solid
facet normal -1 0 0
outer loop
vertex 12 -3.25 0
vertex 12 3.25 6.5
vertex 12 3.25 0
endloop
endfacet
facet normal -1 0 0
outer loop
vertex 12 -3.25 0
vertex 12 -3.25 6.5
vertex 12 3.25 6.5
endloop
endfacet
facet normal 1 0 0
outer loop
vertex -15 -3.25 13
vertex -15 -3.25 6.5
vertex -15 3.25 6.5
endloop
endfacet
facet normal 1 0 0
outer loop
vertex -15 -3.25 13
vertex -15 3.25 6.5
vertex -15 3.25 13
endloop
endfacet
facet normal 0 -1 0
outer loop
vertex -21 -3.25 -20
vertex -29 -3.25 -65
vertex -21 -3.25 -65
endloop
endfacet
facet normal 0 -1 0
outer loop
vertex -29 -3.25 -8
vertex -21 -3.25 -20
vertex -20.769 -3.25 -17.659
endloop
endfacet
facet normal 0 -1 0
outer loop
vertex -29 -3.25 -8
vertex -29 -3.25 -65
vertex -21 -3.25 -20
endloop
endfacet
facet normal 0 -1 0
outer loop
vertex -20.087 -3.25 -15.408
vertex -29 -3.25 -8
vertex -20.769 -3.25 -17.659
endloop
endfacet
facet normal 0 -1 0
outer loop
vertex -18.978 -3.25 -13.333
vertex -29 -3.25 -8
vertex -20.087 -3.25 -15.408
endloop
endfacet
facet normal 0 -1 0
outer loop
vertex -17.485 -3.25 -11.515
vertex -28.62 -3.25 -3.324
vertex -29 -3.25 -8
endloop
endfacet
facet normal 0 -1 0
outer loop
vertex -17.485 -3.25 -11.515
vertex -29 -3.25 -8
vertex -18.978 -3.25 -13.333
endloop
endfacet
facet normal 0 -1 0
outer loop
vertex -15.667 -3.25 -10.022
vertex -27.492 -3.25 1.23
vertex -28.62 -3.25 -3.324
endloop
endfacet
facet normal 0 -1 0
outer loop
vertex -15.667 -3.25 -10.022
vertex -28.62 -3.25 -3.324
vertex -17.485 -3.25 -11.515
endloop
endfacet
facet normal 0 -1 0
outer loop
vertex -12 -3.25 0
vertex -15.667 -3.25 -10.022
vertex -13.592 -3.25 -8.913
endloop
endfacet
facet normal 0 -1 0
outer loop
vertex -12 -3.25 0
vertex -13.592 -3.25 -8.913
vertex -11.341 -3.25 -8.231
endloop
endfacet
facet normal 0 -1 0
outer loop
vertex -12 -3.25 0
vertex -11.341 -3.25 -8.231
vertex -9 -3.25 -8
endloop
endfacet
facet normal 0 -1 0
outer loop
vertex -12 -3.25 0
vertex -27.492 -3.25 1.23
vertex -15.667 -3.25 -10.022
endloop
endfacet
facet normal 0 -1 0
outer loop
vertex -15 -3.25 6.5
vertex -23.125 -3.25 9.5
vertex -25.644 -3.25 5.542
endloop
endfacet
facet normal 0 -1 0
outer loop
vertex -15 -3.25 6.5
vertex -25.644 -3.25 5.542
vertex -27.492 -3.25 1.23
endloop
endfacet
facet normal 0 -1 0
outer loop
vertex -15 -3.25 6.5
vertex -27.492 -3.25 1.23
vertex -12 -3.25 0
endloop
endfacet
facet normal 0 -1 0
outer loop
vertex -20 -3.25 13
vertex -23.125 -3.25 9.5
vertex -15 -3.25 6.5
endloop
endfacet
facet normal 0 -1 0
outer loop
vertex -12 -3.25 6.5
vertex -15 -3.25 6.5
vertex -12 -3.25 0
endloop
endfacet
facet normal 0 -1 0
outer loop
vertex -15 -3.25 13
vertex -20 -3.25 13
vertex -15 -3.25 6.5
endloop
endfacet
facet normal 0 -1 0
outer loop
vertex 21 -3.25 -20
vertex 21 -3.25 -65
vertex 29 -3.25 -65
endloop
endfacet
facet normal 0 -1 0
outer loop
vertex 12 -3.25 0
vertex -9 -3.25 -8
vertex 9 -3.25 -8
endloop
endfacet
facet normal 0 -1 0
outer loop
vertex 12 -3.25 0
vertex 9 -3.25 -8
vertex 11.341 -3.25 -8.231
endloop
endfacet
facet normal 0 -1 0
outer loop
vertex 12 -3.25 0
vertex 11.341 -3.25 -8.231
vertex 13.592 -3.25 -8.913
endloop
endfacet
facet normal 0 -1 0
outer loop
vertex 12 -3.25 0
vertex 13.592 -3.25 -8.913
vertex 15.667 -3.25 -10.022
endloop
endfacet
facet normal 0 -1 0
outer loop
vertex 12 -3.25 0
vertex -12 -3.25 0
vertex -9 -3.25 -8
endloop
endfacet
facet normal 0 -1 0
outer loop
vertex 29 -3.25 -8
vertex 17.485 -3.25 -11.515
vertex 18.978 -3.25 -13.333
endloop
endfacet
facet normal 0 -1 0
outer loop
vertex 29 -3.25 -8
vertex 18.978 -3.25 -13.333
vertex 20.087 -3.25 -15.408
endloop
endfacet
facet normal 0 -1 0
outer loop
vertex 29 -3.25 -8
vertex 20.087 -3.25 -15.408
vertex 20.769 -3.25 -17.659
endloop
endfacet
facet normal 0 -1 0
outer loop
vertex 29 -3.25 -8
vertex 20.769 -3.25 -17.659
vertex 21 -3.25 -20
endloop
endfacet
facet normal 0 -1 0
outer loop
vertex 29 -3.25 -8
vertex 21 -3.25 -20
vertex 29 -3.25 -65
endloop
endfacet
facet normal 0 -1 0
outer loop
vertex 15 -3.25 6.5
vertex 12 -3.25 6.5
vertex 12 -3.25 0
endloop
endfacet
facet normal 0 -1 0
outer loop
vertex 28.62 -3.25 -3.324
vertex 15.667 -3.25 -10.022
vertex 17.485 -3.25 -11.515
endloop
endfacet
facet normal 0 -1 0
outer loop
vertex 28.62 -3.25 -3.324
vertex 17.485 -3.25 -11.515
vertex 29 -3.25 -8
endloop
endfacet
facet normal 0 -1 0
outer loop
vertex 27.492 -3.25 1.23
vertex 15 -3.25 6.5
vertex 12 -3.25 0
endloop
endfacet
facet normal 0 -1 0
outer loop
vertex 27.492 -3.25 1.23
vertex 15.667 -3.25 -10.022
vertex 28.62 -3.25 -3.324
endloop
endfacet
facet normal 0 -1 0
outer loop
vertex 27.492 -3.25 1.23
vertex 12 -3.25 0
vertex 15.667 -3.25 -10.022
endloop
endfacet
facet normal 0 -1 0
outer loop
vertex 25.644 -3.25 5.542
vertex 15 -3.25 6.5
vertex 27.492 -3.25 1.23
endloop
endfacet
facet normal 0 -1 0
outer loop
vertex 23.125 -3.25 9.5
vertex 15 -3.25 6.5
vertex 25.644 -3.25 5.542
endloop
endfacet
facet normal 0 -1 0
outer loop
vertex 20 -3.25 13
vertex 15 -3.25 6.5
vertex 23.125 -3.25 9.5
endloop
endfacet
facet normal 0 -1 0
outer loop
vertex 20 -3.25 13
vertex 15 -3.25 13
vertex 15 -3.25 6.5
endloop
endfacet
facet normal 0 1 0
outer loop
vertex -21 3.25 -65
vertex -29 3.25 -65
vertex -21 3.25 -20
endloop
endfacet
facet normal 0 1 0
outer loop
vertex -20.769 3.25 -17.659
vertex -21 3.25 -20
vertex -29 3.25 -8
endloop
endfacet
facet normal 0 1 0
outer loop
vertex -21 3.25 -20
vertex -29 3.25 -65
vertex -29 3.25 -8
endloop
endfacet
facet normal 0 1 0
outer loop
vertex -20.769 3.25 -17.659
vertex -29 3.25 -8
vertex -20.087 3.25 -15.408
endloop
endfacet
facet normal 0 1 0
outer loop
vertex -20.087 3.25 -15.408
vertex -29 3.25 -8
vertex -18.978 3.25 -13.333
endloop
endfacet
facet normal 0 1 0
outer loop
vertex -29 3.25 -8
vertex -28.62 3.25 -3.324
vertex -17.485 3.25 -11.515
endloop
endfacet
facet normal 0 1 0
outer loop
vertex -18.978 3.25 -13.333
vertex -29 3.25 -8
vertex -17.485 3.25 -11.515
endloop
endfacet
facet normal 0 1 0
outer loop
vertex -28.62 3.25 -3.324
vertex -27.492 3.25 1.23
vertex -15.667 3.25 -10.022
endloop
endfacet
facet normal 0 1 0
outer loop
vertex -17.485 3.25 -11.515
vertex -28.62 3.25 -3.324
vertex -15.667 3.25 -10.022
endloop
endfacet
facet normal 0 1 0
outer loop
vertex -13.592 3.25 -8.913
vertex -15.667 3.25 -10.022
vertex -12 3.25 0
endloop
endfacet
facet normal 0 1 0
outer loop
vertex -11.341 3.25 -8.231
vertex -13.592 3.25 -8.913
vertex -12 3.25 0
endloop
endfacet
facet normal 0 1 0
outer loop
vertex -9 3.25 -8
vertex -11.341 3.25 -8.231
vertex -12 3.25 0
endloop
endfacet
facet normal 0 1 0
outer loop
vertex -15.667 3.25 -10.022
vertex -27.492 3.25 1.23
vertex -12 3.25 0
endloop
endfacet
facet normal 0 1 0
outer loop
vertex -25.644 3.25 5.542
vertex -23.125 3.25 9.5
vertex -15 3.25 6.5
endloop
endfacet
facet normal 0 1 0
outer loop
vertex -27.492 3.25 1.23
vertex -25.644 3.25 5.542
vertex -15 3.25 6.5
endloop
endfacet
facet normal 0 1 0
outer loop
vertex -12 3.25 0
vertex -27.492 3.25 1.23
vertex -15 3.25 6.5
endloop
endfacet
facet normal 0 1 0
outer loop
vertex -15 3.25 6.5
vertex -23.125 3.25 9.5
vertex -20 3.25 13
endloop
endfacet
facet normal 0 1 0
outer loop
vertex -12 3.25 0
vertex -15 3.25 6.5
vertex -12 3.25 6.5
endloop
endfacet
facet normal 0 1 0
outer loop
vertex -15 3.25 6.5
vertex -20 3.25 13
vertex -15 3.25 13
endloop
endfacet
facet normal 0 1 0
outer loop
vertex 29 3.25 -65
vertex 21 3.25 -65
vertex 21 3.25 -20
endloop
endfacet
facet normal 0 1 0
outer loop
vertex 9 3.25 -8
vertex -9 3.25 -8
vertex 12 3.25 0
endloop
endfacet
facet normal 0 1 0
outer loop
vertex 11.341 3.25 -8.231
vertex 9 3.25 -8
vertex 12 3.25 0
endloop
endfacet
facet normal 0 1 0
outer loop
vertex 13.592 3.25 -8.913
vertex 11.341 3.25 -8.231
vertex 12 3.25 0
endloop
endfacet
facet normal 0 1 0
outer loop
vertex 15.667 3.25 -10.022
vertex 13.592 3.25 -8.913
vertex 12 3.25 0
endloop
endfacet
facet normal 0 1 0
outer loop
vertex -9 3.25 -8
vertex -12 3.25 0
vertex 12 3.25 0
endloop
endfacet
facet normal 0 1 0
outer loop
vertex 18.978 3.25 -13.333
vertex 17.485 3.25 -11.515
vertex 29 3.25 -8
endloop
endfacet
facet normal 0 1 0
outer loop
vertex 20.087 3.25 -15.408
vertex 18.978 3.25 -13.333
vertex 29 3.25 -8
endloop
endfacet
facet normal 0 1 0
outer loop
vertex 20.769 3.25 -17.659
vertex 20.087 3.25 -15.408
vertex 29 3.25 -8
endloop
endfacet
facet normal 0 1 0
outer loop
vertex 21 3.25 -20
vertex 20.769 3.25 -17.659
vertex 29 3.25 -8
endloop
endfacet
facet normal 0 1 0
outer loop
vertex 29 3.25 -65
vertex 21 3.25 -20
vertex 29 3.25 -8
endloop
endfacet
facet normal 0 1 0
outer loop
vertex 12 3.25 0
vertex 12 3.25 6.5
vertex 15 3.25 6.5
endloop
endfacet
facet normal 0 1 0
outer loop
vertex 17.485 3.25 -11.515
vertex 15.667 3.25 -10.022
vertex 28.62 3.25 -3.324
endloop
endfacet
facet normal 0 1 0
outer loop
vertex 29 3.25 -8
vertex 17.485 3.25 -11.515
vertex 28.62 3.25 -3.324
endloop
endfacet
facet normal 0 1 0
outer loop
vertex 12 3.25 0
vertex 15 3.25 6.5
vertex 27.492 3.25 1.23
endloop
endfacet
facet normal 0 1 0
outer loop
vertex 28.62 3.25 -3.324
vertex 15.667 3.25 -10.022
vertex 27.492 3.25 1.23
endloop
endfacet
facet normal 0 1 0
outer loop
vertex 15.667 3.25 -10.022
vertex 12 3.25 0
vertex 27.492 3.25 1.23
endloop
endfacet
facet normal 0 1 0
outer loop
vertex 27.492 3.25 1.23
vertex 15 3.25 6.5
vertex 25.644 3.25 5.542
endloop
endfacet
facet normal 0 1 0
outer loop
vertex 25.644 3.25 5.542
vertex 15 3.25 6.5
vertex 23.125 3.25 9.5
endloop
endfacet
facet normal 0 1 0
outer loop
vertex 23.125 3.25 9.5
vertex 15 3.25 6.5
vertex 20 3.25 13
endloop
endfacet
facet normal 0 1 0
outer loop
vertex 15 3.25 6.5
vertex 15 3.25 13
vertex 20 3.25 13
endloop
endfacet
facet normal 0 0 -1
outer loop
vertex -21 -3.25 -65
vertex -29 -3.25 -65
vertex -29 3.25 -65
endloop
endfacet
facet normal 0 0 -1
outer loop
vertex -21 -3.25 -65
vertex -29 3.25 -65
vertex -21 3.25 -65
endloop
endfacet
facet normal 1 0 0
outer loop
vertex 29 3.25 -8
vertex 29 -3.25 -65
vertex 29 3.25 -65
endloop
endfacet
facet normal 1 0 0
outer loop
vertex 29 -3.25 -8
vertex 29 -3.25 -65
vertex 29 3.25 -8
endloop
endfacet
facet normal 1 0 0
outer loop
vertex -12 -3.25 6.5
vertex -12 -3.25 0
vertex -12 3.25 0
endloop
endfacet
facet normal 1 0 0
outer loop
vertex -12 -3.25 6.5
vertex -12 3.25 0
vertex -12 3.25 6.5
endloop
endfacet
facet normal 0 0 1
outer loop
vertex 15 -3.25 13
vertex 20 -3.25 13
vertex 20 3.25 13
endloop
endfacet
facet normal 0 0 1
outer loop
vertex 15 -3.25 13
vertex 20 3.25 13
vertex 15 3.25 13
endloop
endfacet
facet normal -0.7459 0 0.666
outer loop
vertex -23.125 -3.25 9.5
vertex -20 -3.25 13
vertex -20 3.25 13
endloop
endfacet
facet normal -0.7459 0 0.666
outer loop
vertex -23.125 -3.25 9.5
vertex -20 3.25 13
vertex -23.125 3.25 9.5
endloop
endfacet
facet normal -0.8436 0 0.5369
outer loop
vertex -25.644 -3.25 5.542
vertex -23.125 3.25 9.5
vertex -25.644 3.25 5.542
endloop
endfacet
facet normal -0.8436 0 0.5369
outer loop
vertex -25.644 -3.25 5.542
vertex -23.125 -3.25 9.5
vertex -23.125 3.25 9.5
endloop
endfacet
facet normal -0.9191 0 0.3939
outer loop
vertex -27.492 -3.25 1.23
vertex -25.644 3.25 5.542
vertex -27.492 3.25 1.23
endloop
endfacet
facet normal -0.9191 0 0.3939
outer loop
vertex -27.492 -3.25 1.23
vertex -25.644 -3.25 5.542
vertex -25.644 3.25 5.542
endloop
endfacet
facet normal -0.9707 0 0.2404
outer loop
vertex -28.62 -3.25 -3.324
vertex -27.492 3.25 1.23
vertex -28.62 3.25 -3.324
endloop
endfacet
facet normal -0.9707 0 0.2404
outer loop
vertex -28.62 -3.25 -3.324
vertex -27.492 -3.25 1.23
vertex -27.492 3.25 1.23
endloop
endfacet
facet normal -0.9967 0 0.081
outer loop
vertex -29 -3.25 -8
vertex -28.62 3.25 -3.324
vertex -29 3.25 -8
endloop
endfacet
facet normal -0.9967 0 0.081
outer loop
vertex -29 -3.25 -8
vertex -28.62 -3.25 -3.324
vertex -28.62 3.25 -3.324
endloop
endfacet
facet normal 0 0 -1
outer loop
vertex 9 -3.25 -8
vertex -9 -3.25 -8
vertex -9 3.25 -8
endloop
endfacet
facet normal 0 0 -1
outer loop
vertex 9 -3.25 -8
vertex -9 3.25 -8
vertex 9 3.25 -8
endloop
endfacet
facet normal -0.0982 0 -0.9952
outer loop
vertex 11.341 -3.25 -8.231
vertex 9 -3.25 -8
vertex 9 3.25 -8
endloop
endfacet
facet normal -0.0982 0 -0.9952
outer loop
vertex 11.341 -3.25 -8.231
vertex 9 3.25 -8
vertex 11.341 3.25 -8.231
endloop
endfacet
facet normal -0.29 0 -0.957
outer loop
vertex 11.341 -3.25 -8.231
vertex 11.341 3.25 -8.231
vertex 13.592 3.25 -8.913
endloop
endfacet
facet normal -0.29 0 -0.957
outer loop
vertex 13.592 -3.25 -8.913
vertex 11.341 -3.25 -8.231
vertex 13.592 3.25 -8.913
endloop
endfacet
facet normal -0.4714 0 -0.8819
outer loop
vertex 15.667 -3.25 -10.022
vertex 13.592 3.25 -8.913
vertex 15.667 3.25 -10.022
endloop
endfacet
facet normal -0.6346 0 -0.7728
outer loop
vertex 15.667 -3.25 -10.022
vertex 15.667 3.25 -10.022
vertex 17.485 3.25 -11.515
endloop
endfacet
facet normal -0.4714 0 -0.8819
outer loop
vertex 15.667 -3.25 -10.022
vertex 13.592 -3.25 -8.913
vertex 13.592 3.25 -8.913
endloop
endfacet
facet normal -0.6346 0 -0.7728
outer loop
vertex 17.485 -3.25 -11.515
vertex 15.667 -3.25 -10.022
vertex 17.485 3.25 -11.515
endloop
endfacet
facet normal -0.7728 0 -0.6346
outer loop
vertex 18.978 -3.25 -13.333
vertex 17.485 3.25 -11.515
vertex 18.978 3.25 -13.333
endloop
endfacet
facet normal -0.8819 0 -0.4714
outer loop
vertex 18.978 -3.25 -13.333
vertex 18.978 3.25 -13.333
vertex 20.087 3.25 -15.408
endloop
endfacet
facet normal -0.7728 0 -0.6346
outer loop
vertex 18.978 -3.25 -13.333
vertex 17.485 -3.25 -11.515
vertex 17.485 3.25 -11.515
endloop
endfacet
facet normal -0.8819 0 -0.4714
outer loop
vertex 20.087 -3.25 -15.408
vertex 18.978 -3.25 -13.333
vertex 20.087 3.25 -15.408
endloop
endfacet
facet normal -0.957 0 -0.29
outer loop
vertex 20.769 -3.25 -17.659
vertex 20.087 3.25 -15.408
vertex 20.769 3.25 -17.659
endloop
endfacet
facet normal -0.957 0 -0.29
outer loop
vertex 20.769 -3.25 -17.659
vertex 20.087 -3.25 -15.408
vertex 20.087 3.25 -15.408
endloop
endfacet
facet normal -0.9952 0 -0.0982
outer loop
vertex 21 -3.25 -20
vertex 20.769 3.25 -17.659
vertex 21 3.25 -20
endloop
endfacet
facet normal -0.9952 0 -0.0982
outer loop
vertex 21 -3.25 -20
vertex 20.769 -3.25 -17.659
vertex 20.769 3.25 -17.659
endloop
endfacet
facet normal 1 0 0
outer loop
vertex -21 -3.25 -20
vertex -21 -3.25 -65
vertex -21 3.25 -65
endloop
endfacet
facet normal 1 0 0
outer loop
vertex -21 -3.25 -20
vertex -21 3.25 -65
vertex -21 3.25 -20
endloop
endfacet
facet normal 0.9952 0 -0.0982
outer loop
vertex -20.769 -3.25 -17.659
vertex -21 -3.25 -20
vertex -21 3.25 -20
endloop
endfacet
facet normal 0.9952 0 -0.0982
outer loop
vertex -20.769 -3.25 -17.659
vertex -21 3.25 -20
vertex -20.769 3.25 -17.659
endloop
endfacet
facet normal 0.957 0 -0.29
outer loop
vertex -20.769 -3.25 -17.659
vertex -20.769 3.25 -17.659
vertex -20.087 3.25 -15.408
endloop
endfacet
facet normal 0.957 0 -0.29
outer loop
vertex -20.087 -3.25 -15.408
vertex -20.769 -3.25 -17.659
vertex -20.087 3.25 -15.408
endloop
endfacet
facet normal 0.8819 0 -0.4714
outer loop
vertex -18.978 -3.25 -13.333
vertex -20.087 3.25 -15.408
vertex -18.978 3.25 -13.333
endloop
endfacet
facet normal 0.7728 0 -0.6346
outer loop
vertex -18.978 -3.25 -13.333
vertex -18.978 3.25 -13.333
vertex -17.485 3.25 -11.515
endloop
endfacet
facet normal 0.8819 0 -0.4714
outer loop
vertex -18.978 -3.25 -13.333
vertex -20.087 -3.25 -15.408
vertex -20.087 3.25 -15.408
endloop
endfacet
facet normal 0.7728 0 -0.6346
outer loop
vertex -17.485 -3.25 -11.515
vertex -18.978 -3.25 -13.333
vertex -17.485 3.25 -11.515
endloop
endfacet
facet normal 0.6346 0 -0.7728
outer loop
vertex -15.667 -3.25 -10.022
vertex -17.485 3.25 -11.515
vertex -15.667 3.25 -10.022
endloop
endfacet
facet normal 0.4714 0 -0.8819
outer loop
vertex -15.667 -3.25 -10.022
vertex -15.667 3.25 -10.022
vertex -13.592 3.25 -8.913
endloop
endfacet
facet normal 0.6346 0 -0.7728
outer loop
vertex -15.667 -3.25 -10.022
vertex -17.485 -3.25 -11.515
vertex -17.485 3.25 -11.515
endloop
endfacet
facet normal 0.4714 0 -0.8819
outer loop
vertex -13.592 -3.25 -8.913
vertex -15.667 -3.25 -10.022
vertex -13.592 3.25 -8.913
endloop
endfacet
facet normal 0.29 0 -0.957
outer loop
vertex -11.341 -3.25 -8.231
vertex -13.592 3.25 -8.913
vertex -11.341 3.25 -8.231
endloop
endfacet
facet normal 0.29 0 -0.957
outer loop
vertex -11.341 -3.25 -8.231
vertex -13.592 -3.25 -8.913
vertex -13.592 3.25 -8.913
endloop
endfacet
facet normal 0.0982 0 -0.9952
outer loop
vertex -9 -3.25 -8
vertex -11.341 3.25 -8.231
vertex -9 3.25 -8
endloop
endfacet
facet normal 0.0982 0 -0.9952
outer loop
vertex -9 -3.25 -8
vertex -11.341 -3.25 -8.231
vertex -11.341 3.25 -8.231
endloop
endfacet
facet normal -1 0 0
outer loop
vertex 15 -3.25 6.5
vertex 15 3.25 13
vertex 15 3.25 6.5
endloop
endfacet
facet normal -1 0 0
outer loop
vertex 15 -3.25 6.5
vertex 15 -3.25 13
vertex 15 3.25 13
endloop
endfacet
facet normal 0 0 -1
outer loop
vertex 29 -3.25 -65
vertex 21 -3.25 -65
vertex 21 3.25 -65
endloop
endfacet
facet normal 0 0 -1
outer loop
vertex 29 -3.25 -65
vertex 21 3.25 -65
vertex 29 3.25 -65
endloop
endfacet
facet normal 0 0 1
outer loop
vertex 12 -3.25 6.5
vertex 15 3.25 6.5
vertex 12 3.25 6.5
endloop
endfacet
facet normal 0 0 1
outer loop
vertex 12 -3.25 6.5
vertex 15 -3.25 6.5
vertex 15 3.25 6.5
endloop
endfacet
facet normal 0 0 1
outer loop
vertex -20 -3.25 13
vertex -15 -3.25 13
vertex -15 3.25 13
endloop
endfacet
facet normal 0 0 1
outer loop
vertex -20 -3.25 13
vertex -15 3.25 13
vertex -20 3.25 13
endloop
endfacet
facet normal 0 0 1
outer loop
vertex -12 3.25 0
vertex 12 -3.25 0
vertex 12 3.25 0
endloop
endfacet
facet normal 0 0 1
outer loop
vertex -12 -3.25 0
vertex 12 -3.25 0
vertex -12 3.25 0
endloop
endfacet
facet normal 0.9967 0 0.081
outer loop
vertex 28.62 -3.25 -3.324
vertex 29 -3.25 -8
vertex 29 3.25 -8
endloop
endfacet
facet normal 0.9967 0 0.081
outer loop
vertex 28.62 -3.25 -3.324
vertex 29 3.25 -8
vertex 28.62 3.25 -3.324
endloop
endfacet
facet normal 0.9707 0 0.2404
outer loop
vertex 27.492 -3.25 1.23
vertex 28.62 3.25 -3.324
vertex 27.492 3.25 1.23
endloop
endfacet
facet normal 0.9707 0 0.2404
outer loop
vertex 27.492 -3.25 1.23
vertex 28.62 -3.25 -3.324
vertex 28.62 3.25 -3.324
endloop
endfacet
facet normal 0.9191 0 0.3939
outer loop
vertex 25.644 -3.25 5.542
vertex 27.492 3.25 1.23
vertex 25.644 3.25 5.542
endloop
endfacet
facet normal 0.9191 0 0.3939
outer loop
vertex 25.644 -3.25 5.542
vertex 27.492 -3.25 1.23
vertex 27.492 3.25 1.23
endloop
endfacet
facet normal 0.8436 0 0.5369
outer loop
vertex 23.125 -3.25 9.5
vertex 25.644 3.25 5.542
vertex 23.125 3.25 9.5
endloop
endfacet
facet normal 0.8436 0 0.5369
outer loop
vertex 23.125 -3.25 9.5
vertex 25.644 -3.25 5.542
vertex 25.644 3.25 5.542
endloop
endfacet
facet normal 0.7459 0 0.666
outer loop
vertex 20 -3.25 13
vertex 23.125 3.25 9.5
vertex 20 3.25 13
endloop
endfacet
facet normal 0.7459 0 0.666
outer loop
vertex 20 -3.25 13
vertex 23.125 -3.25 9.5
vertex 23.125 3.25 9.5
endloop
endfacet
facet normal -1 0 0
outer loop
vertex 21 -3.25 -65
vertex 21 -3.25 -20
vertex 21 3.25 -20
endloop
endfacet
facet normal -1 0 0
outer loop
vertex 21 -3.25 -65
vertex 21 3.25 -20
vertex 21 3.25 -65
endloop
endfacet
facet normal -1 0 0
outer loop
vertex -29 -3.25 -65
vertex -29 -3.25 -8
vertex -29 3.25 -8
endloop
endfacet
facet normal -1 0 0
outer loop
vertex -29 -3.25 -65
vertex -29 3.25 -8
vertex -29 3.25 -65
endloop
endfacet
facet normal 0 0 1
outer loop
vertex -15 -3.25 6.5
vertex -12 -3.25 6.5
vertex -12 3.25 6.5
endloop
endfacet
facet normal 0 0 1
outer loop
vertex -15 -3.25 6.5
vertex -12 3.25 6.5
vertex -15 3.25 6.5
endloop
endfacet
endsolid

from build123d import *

# Parameters (mm, degrees)
F1_DEPTH = 3.25


with BuildPart() as f1:
    # F0 (on Front) → F1 (new body, symmetric)
    with BuildSketch(Plane.XZ):
        with BuildLine():
            Line((12, 6.5), (12, 0))
            Line((12, 0), (-12, 0))
            Line((-12, 0), (-12, 6.5))
            Line((-12, 6.5), (-15, 6.5))
            Line((-15, 6.5), (-15, 13))
            Line((-15, 13), (-20, 13))
            ThreePointArc((-20, 13), (-26.655206, 3.42366), (-29, -8))
            Line((-29, -8), (-29, -65))
            Line((-29, -65), (-21, -65))
            Line((-21, -65), (-21, -20))
            ThreePointArc((-21, -20), (-17.485281, -11.514719), (-9, -8))
            Line((-9, -8), (9, -8))
            ThreePointArc((9, -8), (17.485281, -11.514719), (21, -20))
            Line((21, -20), (21, -65))
            Line((21, -65), (29, -65))
            Line((29, -65), (29, -8))
            ThreePointArc((29, -8), (26.655206, 3.42366), (20, 13))
            Line((20, 13), (15, 13))
            Line((15, 13), (15, 6.5))
            Line((15, 6.5), (12, 6.5))
        make_face()
    extrude(amount=F1_DEPTH, both=True)


solid = f1.part
